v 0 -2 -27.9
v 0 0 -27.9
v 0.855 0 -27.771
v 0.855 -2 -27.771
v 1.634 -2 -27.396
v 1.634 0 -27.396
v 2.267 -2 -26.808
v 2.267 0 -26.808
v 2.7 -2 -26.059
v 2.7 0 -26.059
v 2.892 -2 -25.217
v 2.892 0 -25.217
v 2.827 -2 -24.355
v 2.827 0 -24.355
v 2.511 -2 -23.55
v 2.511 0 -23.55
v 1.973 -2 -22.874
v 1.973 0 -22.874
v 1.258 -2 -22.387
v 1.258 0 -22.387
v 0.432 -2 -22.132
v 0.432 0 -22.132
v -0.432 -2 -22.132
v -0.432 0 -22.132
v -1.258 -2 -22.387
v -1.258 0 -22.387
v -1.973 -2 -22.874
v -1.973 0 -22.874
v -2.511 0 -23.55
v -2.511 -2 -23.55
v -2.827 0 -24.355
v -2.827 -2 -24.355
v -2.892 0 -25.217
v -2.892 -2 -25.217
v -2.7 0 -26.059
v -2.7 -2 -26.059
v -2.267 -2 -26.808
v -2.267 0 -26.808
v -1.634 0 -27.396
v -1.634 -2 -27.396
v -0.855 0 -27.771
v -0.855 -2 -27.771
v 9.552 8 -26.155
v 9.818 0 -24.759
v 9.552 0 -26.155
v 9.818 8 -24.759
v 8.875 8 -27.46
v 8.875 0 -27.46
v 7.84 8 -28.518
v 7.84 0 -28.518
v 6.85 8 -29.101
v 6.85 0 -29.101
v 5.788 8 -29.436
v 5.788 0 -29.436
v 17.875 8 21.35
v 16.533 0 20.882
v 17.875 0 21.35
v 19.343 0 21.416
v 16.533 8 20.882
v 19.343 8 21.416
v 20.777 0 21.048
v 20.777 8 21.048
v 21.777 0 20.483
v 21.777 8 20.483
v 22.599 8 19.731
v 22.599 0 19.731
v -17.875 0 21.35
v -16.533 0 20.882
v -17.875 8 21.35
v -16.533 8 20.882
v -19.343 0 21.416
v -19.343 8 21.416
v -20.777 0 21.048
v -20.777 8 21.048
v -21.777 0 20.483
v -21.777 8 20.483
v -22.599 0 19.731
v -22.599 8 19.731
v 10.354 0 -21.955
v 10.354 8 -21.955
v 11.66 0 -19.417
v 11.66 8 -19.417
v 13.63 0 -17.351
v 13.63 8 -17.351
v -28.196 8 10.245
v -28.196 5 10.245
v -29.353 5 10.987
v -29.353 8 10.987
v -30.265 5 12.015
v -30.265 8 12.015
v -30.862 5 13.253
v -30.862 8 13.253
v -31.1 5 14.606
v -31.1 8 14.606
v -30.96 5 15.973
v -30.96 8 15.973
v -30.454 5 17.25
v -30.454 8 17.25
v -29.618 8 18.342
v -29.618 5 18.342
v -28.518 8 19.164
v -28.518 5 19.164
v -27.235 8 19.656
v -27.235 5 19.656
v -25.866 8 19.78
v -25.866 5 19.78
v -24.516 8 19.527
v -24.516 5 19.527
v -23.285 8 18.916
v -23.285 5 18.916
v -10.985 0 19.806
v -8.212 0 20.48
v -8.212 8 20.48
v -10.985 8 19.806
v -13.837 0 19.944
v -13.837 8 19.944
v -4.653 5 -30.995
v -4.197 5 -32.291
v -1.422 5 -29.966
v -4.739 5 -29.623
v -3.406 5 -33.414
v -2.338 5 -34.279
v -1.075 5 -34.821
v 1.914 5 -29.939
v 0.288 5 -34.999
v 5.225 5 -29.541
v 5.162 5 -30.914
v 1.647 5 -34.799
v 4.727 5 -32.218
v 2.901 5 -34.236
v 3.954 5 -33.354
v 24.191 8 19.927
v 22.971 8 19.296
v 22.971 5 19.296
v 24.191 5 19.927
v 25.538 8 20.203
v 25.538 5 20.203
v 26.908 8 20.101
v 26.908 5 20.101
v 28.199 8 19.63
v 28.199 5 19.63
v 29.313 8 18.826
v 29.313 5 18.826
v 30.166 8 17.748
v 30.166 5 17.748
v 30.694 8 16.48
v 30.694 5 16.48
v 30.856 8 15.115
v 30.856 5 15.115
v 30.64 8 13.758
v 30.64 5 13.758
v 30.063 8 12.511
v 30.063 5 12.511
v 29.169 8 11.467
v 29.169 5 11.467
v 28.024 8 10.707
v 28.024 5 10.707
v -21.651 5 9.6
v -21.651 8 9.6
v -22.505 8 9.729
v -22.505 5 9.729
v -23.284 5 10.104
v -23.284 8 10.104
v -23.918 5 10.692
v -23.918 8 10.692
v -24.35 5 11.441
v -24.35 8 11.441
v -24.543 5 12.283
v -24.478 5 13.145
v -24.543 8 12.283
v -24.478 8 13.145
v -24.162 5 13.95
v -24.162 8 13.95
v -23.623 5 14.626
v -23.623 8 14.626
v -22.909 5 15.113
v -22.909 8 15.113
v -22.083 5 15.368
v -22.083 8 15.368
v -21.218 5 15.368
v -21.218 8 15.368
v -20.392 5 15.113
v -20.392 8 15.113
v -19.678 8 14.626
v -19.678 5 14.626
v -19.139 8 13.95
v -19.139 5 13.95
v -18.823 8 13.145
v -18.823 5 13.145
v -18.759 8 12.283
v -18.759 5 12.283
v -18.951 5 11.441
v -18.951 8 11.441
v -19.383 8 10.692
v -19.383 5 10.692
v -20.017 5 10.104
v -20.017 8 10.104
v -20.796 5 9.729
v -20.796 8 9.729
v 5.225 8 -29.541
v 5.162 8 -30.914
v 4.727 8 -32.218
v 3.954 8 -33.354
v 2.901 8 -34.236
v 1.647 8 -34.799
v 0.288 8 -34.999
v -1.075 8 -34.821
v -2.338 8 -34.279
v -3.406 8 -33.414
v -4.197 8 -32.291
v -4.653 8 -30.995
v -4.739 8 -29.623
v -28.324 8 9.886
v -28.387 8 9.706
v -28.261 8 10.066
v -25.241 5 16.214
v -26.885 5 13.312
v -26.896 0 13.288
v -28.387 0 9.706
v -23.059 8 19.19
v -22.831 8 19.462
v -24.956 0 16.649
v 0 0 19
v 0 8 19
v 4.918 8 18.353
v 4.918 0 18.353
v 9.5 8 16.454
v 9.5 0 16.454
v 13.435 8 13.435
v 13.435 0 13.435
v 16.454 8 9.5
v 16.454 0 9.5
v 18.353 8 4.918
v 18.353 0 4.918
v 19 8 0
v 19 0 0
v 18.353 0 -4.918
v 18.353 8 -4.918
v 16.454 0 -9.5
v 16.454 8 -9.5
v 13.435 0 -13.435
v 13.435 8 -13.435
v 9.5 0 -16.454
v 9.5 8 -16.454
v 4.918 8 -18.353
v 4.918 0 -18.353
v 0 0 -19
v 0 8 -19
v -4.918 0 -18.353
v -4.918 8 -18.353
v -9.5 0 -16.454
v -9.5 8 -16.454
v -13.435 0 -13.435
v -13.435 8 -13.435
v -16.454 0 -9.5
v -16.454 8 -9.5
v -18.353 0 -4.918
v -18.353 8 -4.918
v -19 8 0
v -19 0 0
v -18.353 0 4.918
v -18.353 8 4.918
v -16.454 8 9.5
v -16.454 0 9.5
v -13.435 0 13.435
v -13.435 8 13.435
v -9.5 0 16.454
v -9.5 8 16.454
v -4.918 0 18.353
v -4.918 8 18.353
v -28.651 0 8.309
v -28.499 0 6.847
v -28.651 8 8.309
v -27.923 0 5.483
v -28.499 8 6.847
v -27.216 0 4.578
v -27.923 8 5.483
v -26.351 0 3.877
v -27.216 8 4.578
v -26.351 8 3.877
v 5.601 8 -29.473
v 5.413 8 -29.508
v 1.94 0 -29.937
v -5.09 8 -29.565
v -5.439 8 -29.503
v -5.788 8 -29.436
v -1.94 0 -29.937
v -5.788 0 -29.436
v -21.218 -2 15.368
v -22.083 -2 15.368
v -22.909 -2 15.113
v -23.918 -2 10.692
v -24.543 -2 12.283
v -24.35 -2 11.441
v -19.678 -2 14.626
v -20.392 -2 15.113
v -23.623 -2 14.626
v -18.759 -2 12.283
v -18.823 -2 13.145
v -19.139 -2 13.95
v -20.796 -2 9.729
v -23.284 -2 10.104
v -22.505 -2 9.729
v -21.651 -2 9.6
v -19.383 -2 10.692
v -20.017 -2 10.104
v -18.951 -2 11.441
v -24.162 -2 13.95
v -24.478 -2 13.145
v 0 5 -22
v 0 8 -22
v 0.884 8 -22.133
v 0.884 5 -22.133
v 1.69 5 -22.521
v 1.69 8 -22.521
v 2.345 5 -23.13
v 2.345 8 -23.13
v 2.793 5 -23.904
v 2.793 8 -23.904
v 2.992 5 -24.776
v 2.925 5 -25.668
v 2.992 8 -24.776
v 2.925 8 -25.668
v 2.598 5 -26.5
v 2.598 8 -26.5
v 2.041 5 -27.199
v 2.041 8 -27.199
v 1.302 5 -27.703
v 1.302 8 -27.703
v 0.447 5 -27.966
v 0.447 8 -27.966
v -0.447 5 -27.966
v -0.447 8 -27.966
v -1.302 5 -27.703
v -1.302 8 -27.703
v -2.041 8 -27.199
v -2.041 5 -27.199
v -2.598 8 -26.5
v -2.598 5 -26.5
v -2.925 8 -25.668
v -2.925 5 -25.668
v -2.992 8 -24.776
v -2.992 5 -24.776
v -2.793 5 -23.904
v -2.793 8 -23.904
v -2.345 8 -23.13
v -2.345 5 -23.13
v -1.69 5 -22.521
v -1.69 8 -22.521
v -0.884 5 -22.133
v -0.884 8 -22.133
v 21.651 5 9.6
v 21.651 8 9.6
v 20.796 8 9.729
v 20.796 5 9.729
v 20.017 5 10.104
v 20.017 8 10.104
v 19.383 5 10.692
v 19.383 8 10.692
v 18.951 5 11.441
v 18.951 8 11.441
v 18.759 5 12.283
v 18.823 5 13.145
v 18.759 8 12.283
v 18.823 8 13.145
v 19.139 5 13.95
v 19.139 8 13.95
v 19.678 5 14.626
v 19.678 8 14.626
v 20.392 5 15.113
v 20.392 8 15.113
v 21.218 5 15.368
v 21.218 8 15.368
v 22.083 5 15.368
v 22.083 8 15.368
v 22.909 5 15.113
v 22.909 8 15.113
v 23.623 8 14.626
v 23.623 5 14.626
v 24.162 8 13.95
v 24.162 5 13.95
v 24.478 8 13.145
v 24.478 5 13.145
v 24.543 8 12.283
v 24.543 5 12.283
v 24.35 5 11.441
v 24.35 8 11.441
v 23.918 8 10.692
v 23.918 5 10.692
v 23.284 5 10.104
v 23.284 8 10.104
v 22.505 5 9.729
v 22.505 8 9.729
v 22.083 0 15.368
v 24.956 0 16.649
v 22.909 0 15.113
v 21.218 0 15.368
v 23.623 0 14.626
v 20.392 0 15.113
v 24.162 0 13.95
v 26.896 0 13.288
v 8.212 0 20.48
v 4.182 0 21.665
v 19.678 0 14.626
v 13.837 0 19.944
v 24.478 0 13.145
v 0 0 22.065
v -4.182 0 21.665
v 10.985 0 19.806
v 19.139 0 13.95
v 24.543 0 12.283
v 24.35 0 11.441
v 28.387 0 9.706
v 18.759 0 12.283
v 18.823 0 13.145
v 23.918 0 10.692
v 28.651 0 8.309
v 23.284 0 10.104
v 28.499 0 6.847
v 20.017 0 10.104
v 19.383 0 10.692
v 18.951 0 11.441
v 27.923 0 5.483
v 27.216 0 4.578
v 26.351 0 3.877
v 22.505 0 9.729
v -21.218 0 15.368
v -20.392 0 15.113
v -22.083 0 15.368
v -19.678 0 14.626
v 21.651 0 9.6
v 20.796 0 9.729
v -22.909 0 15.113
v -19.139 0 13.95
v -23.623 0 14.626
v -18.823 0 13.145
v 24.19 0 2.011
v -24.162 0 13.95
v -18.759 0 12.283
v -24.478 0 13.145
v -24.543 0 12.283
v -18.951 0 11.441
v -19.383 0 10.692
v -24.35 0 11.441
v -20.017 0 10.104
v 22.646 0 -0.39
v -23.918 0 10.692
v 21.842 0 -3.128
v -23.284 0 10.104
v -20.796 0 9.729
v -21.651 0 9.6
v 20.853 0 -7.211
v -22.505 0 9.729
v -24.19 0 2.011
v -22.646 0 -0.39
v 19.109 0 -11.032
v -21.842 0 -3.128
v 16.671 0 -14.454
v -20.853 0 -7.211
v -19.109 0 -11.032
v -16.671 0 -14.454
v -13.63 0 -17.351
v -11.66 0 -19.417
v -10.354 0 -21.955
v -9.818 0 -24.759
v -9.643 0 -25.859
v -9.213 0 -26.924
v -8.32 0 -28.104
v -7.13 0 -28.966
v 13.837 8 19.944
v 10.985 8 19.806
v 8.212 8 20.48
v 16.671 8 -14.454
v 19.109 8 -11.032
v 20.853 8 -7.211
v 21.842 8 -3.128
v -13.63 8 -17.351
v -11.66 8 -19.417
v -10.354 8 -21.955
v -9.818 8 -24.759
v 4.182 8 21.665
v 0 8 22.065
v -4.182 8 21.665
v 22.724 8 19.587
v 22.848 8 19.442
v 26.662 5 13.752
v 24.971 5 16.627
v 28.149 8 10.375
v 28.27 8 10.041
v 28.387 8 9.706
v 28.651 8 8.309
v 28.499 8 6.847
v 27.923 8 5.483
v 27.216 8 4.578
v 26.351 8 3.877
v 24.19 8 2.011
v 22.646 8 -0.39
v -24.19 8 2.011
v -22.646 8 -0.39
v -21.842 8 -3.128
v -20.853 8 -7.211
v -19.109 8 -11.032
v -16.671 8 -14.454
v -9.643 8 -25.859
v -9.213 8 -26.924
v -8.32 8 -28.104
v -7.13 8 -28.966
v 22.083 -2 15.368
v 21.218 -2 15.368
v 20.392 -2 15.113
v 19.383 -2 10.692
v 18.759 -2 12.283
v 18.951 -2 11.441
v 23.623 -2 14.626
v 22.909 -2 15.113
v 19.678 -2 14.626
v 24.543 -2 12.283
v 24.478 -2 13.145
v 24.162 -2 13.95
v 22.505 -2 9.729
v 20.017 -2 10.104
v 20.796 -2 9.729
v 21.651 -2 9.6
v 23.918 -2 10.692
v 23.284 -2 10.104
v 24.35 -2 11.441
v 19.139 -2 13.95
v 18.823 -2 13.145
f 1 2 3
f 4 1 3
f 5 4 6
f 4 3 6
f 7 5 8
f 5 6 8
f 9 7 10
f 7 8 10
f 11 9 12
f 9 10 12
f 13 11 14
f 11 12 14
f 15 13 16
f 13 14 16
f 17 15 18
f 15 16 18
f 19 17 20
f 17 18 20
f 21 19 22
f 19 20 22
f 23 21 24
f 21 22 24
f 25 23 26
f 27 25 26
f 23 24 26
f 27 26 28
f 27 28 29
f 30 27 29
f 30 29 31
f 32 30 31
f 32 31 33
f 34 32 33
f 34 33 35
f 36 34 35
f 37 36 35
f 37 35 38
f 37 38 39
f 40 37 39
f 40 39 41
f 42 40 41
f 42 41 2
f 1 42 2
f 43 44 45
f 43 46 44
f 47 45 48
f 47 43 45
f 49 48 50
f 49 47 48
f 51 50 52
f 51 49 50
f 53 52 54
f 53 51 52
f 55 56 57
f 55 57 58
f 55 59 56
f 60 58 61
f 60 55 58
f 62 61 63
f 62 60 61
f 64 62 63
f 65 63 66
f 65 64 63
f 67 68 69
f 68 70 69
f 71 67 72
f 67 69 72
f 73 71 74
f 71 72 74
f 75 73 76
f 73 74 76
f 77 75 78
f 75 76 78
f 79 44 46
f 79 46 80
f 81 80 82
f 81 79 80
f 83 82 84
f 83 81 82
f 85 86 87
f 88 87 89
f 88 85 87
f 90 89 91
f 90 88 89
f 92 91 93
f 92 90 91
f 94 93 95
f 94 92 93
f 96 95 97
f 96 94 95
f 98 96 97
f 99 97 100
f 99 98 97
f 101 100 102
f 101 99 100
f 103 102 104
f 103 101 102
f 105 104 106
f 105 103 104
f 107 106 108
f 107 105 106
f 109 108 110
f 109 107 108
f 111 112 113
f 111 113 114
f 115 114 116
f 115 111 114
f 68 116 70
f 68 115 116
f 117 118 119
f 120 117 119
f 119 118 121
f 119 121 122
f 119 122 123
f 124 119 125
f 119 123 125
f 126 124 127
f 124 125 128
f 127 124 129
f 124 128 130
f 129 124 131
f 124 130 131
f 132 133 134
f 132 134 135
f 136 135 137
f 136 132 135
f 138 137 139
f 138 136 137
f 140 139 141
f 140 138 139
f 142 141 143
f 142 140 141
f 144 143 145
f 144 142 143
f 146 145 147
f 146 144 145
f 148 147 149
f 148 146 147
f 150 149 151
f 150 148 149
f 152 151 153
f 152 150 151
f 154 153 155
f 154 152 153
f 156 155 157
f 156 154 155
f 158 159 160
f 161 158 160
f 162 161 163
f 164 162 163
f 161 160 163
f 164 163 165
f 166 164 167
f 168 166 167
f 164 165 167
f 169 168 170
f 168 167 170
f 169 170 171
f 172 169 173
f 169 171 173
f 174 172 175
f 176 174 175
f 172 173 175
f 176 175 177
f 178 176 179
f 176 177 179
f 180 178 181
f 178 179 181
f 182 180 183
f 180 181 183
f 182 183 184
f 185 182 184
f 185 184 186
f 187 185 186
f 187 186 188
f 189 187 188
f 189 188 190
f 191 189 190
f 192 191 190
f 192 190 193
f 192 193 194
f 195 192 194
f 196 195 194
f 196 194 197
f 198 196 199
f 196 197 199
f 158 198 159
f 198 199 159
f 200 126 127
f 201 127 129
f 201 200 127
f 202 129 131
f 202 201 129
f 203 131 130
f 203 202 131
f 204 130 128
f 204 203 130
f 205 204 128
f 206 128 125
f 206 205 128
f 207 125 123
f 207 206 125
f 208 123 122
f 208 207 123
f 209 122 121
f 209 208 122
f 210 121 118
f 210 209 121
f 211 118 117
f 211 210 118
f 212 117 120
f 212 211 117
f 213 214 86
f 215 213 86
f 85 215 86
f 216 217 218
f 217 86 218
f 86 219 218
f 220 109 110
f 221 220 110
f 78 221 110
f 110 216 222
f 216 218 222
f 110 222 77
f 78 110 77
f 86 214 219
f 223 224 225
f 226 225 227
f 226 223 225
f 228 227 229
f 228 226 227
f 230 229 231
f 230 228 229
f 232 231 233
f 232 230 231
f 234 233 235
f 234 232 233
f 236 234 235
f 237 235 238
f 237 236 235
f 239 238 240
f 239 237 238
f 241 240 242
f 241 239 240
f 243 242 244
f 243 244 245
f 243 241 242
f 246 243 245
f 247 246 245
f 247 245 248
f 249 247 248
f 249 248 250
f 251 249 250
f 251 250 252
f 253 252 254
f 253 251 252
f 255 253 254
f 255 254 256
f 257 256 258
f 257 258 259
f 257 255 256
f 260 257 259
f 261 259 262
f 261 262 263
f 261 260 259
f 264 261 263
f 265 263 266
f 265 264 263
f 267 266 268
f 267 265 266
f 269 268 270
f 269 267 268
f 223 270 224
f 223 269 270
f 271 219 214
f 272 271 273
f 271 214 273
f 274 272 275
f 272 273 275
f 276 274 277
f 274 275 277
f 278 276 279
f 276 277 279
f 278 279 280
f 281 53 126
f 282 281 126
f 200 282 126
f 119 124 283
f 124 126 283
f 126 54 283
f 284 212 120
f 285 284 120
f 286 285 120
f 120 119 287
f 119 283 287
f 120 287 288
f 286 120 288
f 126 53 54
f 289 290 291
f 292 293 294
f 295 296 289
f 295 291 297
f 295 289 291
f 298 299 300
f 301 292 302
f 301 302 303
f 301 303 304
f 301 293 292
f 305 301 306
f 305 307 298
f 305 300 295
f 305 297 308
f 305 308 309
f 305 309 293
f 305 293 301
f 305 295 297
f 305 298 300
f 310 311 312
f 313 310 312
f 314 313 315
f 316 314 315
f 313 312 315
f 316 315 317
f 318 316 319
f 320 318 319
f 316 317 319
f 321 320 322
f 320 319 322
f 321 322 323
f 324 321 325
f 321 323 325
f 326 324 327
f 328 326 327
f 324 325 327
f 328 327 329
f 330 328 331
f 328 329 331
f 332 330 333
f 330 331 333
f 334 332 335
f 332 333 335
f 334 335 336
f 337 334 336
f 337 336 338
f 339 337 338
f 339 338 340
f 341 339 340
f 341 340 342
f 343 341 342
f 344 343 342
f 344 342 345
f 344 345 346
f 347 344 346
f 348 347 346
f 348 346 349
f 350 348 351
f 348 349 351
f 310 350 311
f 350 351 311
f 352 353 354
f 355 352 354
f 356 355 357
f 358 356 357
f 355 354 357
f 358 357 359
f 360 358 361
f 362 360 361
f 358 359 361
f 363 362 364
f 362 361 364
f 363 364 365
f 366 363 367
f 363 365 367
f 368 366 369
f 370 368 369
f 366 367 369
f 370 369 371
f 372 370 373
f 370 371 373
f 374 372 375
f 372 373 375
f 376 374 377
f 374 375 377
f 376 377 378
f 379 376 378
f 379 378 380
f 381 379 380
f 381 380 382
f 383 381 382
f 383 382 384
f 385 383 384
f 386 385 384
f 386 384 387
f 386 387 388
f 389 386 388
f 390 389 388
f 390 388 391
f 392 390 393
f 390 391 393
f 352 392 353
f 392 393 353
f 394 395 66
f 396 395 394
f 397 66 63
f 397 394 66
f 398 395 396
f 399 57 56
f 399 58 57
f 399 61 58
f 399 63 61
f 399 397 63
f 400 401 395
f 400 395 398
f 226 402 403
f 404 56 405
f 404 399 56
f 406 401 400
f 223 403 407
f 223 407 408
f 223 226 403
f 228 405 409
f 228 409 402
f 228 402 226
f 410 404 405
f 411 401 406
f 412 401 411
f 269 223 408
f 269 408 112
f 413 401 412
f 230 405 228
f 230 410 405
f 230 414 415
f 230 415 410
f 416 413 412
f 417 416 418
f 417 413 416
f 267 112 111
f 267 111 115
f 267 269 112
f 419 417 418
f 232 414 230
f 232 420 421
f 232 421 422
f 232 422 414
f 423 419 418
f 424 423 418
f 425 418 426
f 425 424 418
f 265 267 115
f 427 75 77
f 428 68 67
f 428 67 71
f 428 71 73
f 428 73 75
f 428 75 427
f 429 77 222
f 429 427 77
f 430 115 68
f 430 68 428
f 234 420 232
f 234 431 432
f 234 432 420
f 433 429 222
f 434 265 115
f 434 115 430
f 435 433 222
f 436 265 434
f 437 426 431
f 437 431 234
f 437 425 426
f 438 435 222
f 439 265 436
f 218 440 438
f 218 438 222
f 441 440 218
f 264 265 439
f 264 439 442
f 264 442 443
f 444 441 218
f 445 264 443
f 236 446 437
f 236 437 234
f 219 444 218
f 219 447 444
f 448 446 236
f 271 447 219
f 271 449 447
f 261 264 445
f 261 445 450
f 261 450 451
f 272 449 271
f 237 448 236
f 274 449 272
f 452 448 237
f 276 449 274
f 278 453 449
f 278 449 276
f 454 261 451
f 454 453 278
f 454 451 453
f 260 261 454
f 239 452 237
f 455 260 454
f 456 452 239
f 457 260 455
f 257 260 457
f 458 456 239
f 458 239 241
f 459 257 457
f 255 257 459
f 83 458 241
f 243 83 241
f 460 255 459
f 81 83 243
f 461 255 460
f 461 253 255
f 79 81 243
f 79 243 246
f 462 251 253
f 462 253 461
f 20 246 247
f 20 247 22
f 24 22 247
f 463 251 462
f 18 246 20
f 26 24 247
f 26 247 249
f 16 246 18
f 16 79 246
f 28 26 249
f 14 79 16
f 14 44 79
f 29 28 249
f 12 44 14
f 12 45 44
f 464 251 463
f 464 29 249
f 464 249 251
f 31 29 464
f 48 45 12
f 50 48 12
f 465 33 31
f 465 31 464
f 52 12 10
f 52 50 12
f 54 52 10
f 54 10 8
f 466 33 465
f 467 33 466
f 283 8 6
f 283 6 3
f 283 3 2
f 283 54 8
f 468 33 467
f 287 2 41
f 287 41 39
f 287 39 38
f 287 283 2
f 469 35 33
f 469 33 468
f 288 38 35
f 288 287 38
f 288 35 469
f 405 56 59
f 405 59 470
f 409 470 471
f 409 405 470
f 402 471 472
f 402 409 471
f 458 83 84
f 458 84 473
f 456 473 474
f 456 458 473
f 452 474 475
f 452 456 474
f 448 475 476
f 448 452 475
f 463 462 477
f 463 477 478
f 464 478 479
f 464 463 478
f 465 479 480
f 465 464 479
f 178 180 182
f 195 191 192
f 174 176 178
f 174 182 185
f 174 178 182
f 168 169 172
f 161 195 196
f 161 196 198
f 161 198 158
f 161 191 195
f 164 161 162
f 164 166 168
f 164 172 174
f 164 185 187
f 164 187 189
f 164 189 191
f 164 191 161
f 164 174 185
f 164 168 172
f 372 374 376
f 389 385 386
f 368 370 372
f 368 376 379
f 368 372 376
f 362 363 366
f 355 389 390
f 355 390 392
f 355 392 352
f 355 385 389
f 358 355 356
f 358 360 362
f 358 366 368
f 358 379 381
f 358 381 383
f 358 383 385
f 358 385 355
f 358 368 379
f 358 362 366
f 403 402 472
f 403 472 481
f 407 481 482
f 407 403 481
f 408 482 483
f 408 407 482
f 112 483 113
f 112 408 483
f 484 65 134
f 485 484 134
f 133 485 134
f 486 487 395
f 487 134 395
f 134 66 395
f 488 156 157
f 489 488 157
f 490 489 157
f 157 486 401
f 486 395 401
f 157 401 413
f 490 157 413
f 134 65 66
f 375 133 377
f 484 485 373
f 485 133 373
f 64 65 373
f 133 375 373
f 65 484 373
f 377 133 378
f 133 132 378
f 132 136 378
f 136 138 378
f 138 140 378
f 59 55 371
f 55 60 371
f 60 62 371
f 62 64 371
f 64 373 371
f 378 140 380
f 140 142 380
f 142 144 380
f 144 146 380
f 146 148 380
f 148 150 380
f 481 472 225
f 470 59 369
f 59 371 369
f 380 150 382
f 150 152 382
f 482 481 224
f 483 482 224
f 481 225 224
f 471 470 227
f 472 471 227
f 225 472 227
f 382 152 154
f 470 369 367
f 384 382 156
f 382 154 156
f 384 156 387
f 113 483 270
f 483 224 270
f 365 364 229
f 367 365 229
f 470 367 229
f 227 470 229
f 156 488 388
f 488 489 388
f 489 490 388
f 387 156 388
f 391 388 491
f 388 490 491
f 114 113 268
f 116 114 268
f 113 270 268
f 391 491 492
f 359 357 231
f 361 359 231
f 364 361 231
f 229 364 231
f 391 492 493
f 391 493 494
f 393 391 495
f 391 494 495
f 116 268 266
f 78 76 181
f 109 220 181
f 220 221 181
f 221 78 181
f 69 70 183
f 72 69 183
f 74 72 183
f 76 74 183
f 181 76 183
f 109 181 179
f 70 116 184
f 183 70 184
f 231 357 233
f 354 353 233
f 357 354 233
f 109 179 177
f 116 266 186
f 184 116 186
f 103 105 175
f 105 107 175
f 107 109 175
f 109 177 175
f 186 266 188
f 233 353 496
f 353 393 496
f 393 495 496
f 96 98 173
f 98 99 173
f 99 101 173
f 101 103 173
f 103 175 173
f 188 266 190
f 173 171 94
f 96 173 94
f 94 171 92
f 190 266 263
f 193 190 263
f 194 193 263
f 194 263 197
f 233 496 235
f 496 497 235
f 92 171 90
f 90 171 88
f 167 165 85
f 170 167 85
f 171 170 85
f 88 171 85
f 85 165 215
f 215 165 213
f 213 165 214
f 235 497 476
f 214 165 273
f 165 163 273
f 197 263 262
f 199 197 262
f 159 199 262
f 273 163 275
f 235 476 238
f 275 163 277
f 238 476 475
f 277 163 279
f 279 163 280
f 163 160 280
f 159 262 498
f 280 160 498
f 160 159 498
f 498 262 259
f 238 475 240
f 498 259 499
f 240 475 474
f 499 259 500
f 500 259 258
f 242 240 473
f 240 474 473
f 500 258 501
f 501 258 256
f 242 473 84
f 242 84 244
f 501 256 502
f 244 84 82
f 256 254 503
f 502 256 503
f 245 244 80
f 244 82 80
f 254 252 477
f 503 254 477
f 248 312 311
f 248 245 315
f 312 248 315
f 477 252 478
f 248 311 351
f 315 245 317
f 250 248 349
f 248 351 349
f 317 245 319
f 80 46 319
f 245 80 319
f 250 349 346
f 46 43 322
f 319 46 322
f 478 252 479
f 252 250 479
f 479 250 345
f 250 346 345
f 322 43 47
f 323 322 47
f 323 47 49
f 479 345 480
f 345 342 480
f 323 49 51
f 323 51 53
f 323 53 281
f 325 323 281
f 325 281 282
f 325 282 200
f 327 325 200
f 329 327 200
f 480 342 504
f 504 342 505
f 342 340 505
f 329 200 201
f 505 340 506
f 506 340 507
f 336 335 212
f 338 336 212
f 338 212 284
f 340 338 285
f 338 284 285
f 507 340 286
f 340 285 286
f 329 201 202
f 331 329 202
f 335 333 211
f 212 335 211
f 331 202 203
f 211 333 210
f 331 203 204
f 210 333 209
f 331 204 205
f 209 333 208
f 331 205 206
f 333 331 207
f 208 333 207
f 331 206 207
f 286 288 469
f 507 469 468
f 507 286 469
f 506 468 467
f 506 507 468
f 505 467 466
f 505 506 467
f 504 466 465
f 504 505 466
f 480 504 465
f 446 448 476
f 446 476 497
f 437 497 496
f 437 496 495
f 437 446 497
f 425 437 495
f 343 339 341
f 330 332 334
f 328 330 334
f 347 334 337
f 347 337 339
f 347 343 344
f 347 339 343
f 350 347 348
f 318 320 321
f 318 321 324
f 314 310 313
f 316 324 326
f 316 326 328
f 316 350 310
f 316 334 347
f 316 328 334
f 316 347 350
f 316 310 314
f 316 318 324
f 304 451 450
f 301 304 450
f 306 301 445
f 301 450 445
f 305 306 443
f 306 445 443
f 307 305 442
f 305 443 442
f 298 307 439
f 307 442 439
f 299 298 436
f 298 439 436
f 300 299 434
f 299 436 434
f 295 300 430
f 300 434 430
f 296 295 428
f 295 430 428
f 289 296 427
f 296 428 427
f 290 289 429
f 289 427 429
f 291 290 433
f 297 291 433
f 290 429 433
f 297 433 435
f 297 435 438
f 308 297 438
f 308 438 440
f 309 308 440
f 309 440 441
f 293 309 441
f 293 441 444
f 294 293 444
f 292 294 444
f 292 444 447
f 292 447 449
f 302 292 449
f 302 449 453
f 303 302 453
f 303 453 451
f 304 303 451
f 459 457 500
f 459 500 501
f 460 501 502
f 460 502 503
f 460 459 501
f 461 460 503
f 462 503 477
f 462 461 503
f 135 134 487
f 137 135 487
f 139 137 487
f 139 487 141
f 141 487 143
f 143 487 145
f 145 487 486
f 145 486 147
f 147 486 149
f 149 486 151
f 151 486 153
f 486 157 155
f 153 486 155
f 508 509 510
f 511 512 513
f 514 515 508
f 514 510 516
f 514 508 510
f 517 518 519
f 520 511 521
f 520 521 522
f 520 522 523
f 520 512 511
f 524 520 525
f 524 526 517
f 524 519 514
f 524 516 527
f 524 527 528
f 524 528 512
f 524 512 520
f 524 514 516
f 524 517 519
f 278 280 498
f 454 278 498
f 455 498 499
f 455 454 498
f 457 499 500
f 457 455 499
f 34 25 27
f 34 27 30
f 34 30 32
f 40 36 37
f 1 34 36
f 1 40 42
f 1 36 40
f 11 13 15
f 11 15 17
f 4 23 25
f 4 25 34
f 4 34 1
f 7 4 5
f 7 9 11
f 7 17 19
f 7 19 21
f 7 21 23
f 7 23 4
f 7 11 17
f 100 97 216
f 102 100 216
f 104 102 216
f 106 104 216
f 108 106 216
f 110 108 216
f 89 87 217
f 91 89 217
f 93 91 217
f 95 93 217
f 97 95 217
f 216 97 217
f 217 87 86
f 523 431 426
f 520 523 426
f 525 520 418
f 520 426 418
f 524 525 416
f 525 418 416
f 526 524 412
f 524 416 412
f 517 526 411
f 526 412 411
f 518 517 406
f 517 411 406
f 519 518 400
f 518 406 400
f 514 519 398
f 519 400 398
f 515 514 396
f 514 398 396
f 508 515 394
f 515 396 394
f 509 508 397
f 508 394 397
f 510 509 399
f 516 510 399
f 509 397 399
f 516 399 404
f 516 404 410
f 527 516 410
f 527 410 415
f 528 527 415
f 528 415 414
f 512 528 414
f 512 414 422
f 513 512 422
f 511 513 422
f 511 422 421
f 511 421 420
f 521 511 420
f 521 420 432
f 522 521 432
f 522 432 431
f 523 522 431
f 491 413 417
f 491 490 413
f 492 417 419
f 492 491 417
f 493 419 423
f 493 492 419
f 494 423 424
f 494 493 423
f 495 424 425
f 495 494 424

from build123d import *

# Parameters (mm, degrees)
SKETCH1_R                = 19
BOSS_EXTRUDE1_DEPTH      = 3.5
SKETCH2_R                = 30
SKETCH2_R_2              = 19
SKETCH2_R_3              = 2.8
BOSS_EXTRUDE2_DEPTH      = 8
BOSS_EXTRUDE3_DEPTH      = 2
BOSS_EXTRUDE3_DEPTH_BACK = 8
SKETCH4_R                = 2.9
SKETCH5_R                = 5
BOSS_EXTRUDE4_DEPTH      = 3
CUT_EXTRUDE1_START       = -10
SKETCH3_R                = 19
CUT_EXTRUDE1_DEPTH       = 10
SKETCH6_R                = 3
SKETCH6_R_2              = 2.9
CUT_EXTRUDE2_DEPTH       = 3
CUT_EXTRUDE3_START       = -13
CUT_EXTRUDE3_DEPTH       = 13
FILLET1_R                = 10
FILLET2_R                = 5


with BuildPart() as part:
    # Sketch1 → Boss-Extrude1 (new body)
    with BuildSketch(Plane(origin=(0, 0, 0), x_dir=(1, 0, 0), z_dir=(0, 1, 0))):
        with Locations(Location((0, 0, 0), (0, 0, 270))):
            Circle(SKETCH1_R)
    extrude(amount=BOSS_EXTRUDE1_DEPTH)

    # Sketch2 → Boss-Extrude2 (add)
    with BuildSketch(Plane(origin=(0, 0, 0), x_dir=(1, 0, 0), z_dir=(0, 1, 0))):
        with Locations(Location((0, 0, 0), (0, 0, 270))):
            Circle(SKETCH2_R)
        with Locations(Location((0, 0, 0), (0, 0, 270))):
            Circle(SKETCH2_R_2, mode=Mode.SUBTRACT)
        with Locations(Location((0, 25, 0), (0, 0, 270))):
            Circle(SKETCH2_R_3, mode=Mode.SUBTRACT)
        with Locations(Location((21.650635095, -12.5, 0), (0, 0, 270))):
            Circle(SKETCH2_R_3, mode=Mode.SUBTRACT)
        with Locations(Location((-21.650635095, -12.5, 0), (0, 0, 270))):
            Circle(SKETCH2_R_3, mode=Mode.SUBTRACT)
    extrude(amount=BOSS_EXTRUDE2_DEPTH)

    # Sketch4 → Boss-Extrude3 (add, two sides: drawn at the far end of the back side and taken through both)
    with BuildSketch(Plane.XZ.offset(-BOSS_EXTRUDE3_DEPTH_BACK)):
        with Locations(Location((-21.650635095, 12.5, 0), (0, 0, 270))):
            Circle(SKETCH4_R)
        with Locations(Location((21.650635095, 12.5, 0), (0, 0, 270))):
            Circle(SKETCH4_R)
        with Locations(Location((0, -25, 0), (0, 0, 270))):
            Circle(SKETCH4_R)
    extrude(amount=BOSS_EXTRUDE3_DEPTH + BOSS_EXTRUDE3_DEPTH_BACK)

    # Sketch5 → Boss-Extrude4 (add)
    with BuildSketch(Plane(origin=(0, 8, 0), x_dir=(1, 0, 0), z_dir=(0, 1, 0))):
        with Locations((-26.103110985, -14.7860609)):
            Circle(SKETCH5_R)
        with Locations((0.246451131, 29.99898768)):
            Circle(SKETCH5_R)
        with Locations((25.856659853, -15.212926781)):
            Circle(SKETCH5_R)
    extrude(amount=-BOSS_EXTRUDE4_DEPTH)

    # Sketch3 → Cut-Extrude1 (cut)
    with BuildSketch(Plane(origin=(0, 3.5, 0), x_dir=(1, 0, 0), z_dir=(0, 1, 0)).offset(CUT_EXTRUDE1_START)):
        with Locations(Location((0, 0, 0), (0, 0, 270))):
            Circle(SKETCH3_R)
    extrude(amount=CUT_EXTRUDE1_DEPTH, mode=Mode.SUBTRACT)

    # Sketch6 → Cut-Extrude2 (cut)
    with BuildSketch(Plane(origin=(0, 8, 0), x_dir=(1, 0, 0), z_dir=(0, 1, 0))):
        with Locations(Location((0, 25, 0), (0, 0, 270))):
            Circle(SKETCH6_R)
        with Locations(Location((21.650635095, -12.5, 0), (0, 0, 90))):
            Circle(SKETCH6_R_2)
        with Locations(Location((-21.650635095, -12.5, 0), (0, 0, 90))):
            Circle(SKETCH6_R_2)
    extrude(amount=-CUT_EXTRUDE2_DEPTH, mode=Mode.SUBTRACT)

    # Sketch7 → Cut-Extrude3 (cut)
    with BuildSketch(Plane(origin=(0, 8, 0), x_dir=(1, 0, 0), z_dir=(0, 1, 0)).offset(CUT_EXTRUDE3_START)):
        with BuildLine():
            ThreePointArc((-29.54423259, -5.20944533), (-25.980762114, 15), (-10.2606043, 28.190778624))
            Line((-10.2606043, 28.190778624), (-13.773984089, 37.84371026))
            Line((-13.773984089, 37.84371026), (-43.939319858, -7.747687605))
            Line((-43.939319858, -7.747687605), (-29.54423259, -5.20944533))
        make_face()
        with BuildLine():
            ThreePointArc((-21.729408673, -3.831481024), (-19.108521295, 11.032309914), (-7.546544436, 20.733960432))
            Line((-7.546544436, 20.733960432), (-10.2606043, 28.190778624))
            ThreePointArc((-10.2606043, 28.190778624), (-25.980762114, 15), (-29.54423259, -5.20944533))
            Line((-29.54423259, -5.20944533), (-21.729408673, -3.831481024))
        make_face()
        with BuildLine():
            Line((15.259965643, 41.926411025), (10.2606043, 28.190778624))
            ThreePointArc((10.2606043, 28.190778624), (25.980762114, 15), (29.54423259, -5.20944533))
            Line((29.54423259, -5.20944533), (39.660606503, -6.993234998))
            Line((39.660606503, -6.993234998), (15.259965643, 41.926411025))
        make_face()
        with BuildLine():
            Line((10.2606043, 28.190778624), (7.546544436, 20.733960432))
            ThreePointArc((7.546544436, 20.733960432), (18.074278438, 12.65574601), (22.064619828, 0))
            ThreePointArc((22.064619828, 0), (21.980657288, -1.92305833), (21.729408673, -3.831481024))
            Line((21.729408673, -3.831481024), (29.54423259, -5.20944533))
            ThreePointArc((29.54423259, -5.20944533), (25.980762114, 15), (10.2606043, 28.190778624))
        make_face()
        with BuildLine():
            Line((28.679354216, -34.17872342), (19.283628291, -22.981333294))
            ThreePointArc((19.283628291, -22.981333294), (0, -30), (-19.283628291, -22.981333294))
            Line((-19.283628291, -22.981333294), (-25.886622414, -30.850475262))
            Line((-25.886622414, -30.850475262), (28.679354216, -34.17872342))
        make_face()
        with BuildLine():
            Line((19.283628291, -22.981333294), (14.182864238, -16.902479408))
            ThreePointArc((14.182864238, -16.902479408), (0, -22.064619828), (-14.182864238, -16.902479408))
            Line((-14.182864238, -16.902479408), (-19.283628291, -22.981333294))
            ThreePointArc((-19.283628291, -22.981333294), (0, -30), (19.283628291, -22.981333294))
        make_face()
    extrude(amount=CUT_EXTRUDE3_DEPTH, mode=Mode.SUBTRACT)

    # Fillet1
    # the kernel refuses this fillet: 10 mm, written as the material it adds along each edge
    with BuildSketch(Plane(origin=(-21.729408673, 0, 3.831481024), x_dir=(-0.9848077530122133, 0, 0.17364817766690055), z_dir=(0, 1, 0)), Plane(origin=(14.182864238, 0, 16.902479408), x_dir=(0.6427876096865253, 0, 0.7660444431189899), z_dir=(0, 1, 0)), Plane(origin=(7.546544436, 0, -20.733960432), x_dir=(0.34202014332569675, 0, -0.9396926207858982), z_dir=(0, 1, 0))) as fillet1_piece_1:
        with BuildLine():
            CenterArc((8.404377584, -9.988996017), FILLET1_R, 92.688143309, 69.160575724)
            Line((-1.097995304, -6.873725644), (-1.288042762, -6.811420237))
            ThreePointArc((-1.288042762, -6.811420237), (-0.473724072, -3.448886874), (-0.2, 0))
            Line((-0.2, 0), (0, 0.2))
            ThreePointArc((0, 0.2), (3.967690086, 0.2), (7.926000224, 0.19977992))
            Line((7.926000224, 0.19977992), (7.935380172, 0))
        make_face()
    extrude(amount=8)
    with BuildSketch(Plane(origin=(-14.182864238, 0, 16.902479408), x_dir=(0.8578464941811706, 0, 0.5139060151633514), z_dir=(0, 1, 0)), Plane(origin=(21.729408673, 0, 3.831481024), x_dir=(0.016132417198510746, 0, -0.999869864089989), z_dir=(0, 1, 0)), Plane(origin=(-7.546544436, 0, -20.733960432), x_dir=(-0.8739789113796794, 0, 0.48596384892663586), z_dir=(0, 1, 0))) as fillet1_piece_2:
        with BuildLine():
            CenterArc((8.538251552, -9.87480959), FILLET1_R, 99.075640483, 69.160575724)
            Line((-1.251712984, -7.836036823), (-1.447512274, -7.795261367))
            ThreePointArc((-1.447512274, -7.795261367), (-0.823352684, -3.886470761), (-0.197496192, 0.03154765))
            Line((-0.197496192, 0.03154765), (0.03154765, 0.197496192))
            ThreePointArc((0.03154765, 0.197496192), (3.480434524, -0.07622788), (6.929321399, 0.197496192))
            Line((6.929321399, 0.197496192), (6.960869049, 0))
        make_face()
    extrude(amount=8)

    # Fillet2
    fillet2_edges = [part.edges().sort_by_distance(p)[0] for p in [
        (-19.283628291, 4, 22.981333294),
        (19.283628291, 4, 22.981333294),
        (29.54423259, 4, 5.20944533),
        (10.2606043, 4, -28.190778624),
        (-10.2606043, 4, -28.190778624),
        (-29.54423259, 4, 5.20944533),
    ]]
    fillet(fillet2_edges, radius=FILLET2_R)


solid = part.part
